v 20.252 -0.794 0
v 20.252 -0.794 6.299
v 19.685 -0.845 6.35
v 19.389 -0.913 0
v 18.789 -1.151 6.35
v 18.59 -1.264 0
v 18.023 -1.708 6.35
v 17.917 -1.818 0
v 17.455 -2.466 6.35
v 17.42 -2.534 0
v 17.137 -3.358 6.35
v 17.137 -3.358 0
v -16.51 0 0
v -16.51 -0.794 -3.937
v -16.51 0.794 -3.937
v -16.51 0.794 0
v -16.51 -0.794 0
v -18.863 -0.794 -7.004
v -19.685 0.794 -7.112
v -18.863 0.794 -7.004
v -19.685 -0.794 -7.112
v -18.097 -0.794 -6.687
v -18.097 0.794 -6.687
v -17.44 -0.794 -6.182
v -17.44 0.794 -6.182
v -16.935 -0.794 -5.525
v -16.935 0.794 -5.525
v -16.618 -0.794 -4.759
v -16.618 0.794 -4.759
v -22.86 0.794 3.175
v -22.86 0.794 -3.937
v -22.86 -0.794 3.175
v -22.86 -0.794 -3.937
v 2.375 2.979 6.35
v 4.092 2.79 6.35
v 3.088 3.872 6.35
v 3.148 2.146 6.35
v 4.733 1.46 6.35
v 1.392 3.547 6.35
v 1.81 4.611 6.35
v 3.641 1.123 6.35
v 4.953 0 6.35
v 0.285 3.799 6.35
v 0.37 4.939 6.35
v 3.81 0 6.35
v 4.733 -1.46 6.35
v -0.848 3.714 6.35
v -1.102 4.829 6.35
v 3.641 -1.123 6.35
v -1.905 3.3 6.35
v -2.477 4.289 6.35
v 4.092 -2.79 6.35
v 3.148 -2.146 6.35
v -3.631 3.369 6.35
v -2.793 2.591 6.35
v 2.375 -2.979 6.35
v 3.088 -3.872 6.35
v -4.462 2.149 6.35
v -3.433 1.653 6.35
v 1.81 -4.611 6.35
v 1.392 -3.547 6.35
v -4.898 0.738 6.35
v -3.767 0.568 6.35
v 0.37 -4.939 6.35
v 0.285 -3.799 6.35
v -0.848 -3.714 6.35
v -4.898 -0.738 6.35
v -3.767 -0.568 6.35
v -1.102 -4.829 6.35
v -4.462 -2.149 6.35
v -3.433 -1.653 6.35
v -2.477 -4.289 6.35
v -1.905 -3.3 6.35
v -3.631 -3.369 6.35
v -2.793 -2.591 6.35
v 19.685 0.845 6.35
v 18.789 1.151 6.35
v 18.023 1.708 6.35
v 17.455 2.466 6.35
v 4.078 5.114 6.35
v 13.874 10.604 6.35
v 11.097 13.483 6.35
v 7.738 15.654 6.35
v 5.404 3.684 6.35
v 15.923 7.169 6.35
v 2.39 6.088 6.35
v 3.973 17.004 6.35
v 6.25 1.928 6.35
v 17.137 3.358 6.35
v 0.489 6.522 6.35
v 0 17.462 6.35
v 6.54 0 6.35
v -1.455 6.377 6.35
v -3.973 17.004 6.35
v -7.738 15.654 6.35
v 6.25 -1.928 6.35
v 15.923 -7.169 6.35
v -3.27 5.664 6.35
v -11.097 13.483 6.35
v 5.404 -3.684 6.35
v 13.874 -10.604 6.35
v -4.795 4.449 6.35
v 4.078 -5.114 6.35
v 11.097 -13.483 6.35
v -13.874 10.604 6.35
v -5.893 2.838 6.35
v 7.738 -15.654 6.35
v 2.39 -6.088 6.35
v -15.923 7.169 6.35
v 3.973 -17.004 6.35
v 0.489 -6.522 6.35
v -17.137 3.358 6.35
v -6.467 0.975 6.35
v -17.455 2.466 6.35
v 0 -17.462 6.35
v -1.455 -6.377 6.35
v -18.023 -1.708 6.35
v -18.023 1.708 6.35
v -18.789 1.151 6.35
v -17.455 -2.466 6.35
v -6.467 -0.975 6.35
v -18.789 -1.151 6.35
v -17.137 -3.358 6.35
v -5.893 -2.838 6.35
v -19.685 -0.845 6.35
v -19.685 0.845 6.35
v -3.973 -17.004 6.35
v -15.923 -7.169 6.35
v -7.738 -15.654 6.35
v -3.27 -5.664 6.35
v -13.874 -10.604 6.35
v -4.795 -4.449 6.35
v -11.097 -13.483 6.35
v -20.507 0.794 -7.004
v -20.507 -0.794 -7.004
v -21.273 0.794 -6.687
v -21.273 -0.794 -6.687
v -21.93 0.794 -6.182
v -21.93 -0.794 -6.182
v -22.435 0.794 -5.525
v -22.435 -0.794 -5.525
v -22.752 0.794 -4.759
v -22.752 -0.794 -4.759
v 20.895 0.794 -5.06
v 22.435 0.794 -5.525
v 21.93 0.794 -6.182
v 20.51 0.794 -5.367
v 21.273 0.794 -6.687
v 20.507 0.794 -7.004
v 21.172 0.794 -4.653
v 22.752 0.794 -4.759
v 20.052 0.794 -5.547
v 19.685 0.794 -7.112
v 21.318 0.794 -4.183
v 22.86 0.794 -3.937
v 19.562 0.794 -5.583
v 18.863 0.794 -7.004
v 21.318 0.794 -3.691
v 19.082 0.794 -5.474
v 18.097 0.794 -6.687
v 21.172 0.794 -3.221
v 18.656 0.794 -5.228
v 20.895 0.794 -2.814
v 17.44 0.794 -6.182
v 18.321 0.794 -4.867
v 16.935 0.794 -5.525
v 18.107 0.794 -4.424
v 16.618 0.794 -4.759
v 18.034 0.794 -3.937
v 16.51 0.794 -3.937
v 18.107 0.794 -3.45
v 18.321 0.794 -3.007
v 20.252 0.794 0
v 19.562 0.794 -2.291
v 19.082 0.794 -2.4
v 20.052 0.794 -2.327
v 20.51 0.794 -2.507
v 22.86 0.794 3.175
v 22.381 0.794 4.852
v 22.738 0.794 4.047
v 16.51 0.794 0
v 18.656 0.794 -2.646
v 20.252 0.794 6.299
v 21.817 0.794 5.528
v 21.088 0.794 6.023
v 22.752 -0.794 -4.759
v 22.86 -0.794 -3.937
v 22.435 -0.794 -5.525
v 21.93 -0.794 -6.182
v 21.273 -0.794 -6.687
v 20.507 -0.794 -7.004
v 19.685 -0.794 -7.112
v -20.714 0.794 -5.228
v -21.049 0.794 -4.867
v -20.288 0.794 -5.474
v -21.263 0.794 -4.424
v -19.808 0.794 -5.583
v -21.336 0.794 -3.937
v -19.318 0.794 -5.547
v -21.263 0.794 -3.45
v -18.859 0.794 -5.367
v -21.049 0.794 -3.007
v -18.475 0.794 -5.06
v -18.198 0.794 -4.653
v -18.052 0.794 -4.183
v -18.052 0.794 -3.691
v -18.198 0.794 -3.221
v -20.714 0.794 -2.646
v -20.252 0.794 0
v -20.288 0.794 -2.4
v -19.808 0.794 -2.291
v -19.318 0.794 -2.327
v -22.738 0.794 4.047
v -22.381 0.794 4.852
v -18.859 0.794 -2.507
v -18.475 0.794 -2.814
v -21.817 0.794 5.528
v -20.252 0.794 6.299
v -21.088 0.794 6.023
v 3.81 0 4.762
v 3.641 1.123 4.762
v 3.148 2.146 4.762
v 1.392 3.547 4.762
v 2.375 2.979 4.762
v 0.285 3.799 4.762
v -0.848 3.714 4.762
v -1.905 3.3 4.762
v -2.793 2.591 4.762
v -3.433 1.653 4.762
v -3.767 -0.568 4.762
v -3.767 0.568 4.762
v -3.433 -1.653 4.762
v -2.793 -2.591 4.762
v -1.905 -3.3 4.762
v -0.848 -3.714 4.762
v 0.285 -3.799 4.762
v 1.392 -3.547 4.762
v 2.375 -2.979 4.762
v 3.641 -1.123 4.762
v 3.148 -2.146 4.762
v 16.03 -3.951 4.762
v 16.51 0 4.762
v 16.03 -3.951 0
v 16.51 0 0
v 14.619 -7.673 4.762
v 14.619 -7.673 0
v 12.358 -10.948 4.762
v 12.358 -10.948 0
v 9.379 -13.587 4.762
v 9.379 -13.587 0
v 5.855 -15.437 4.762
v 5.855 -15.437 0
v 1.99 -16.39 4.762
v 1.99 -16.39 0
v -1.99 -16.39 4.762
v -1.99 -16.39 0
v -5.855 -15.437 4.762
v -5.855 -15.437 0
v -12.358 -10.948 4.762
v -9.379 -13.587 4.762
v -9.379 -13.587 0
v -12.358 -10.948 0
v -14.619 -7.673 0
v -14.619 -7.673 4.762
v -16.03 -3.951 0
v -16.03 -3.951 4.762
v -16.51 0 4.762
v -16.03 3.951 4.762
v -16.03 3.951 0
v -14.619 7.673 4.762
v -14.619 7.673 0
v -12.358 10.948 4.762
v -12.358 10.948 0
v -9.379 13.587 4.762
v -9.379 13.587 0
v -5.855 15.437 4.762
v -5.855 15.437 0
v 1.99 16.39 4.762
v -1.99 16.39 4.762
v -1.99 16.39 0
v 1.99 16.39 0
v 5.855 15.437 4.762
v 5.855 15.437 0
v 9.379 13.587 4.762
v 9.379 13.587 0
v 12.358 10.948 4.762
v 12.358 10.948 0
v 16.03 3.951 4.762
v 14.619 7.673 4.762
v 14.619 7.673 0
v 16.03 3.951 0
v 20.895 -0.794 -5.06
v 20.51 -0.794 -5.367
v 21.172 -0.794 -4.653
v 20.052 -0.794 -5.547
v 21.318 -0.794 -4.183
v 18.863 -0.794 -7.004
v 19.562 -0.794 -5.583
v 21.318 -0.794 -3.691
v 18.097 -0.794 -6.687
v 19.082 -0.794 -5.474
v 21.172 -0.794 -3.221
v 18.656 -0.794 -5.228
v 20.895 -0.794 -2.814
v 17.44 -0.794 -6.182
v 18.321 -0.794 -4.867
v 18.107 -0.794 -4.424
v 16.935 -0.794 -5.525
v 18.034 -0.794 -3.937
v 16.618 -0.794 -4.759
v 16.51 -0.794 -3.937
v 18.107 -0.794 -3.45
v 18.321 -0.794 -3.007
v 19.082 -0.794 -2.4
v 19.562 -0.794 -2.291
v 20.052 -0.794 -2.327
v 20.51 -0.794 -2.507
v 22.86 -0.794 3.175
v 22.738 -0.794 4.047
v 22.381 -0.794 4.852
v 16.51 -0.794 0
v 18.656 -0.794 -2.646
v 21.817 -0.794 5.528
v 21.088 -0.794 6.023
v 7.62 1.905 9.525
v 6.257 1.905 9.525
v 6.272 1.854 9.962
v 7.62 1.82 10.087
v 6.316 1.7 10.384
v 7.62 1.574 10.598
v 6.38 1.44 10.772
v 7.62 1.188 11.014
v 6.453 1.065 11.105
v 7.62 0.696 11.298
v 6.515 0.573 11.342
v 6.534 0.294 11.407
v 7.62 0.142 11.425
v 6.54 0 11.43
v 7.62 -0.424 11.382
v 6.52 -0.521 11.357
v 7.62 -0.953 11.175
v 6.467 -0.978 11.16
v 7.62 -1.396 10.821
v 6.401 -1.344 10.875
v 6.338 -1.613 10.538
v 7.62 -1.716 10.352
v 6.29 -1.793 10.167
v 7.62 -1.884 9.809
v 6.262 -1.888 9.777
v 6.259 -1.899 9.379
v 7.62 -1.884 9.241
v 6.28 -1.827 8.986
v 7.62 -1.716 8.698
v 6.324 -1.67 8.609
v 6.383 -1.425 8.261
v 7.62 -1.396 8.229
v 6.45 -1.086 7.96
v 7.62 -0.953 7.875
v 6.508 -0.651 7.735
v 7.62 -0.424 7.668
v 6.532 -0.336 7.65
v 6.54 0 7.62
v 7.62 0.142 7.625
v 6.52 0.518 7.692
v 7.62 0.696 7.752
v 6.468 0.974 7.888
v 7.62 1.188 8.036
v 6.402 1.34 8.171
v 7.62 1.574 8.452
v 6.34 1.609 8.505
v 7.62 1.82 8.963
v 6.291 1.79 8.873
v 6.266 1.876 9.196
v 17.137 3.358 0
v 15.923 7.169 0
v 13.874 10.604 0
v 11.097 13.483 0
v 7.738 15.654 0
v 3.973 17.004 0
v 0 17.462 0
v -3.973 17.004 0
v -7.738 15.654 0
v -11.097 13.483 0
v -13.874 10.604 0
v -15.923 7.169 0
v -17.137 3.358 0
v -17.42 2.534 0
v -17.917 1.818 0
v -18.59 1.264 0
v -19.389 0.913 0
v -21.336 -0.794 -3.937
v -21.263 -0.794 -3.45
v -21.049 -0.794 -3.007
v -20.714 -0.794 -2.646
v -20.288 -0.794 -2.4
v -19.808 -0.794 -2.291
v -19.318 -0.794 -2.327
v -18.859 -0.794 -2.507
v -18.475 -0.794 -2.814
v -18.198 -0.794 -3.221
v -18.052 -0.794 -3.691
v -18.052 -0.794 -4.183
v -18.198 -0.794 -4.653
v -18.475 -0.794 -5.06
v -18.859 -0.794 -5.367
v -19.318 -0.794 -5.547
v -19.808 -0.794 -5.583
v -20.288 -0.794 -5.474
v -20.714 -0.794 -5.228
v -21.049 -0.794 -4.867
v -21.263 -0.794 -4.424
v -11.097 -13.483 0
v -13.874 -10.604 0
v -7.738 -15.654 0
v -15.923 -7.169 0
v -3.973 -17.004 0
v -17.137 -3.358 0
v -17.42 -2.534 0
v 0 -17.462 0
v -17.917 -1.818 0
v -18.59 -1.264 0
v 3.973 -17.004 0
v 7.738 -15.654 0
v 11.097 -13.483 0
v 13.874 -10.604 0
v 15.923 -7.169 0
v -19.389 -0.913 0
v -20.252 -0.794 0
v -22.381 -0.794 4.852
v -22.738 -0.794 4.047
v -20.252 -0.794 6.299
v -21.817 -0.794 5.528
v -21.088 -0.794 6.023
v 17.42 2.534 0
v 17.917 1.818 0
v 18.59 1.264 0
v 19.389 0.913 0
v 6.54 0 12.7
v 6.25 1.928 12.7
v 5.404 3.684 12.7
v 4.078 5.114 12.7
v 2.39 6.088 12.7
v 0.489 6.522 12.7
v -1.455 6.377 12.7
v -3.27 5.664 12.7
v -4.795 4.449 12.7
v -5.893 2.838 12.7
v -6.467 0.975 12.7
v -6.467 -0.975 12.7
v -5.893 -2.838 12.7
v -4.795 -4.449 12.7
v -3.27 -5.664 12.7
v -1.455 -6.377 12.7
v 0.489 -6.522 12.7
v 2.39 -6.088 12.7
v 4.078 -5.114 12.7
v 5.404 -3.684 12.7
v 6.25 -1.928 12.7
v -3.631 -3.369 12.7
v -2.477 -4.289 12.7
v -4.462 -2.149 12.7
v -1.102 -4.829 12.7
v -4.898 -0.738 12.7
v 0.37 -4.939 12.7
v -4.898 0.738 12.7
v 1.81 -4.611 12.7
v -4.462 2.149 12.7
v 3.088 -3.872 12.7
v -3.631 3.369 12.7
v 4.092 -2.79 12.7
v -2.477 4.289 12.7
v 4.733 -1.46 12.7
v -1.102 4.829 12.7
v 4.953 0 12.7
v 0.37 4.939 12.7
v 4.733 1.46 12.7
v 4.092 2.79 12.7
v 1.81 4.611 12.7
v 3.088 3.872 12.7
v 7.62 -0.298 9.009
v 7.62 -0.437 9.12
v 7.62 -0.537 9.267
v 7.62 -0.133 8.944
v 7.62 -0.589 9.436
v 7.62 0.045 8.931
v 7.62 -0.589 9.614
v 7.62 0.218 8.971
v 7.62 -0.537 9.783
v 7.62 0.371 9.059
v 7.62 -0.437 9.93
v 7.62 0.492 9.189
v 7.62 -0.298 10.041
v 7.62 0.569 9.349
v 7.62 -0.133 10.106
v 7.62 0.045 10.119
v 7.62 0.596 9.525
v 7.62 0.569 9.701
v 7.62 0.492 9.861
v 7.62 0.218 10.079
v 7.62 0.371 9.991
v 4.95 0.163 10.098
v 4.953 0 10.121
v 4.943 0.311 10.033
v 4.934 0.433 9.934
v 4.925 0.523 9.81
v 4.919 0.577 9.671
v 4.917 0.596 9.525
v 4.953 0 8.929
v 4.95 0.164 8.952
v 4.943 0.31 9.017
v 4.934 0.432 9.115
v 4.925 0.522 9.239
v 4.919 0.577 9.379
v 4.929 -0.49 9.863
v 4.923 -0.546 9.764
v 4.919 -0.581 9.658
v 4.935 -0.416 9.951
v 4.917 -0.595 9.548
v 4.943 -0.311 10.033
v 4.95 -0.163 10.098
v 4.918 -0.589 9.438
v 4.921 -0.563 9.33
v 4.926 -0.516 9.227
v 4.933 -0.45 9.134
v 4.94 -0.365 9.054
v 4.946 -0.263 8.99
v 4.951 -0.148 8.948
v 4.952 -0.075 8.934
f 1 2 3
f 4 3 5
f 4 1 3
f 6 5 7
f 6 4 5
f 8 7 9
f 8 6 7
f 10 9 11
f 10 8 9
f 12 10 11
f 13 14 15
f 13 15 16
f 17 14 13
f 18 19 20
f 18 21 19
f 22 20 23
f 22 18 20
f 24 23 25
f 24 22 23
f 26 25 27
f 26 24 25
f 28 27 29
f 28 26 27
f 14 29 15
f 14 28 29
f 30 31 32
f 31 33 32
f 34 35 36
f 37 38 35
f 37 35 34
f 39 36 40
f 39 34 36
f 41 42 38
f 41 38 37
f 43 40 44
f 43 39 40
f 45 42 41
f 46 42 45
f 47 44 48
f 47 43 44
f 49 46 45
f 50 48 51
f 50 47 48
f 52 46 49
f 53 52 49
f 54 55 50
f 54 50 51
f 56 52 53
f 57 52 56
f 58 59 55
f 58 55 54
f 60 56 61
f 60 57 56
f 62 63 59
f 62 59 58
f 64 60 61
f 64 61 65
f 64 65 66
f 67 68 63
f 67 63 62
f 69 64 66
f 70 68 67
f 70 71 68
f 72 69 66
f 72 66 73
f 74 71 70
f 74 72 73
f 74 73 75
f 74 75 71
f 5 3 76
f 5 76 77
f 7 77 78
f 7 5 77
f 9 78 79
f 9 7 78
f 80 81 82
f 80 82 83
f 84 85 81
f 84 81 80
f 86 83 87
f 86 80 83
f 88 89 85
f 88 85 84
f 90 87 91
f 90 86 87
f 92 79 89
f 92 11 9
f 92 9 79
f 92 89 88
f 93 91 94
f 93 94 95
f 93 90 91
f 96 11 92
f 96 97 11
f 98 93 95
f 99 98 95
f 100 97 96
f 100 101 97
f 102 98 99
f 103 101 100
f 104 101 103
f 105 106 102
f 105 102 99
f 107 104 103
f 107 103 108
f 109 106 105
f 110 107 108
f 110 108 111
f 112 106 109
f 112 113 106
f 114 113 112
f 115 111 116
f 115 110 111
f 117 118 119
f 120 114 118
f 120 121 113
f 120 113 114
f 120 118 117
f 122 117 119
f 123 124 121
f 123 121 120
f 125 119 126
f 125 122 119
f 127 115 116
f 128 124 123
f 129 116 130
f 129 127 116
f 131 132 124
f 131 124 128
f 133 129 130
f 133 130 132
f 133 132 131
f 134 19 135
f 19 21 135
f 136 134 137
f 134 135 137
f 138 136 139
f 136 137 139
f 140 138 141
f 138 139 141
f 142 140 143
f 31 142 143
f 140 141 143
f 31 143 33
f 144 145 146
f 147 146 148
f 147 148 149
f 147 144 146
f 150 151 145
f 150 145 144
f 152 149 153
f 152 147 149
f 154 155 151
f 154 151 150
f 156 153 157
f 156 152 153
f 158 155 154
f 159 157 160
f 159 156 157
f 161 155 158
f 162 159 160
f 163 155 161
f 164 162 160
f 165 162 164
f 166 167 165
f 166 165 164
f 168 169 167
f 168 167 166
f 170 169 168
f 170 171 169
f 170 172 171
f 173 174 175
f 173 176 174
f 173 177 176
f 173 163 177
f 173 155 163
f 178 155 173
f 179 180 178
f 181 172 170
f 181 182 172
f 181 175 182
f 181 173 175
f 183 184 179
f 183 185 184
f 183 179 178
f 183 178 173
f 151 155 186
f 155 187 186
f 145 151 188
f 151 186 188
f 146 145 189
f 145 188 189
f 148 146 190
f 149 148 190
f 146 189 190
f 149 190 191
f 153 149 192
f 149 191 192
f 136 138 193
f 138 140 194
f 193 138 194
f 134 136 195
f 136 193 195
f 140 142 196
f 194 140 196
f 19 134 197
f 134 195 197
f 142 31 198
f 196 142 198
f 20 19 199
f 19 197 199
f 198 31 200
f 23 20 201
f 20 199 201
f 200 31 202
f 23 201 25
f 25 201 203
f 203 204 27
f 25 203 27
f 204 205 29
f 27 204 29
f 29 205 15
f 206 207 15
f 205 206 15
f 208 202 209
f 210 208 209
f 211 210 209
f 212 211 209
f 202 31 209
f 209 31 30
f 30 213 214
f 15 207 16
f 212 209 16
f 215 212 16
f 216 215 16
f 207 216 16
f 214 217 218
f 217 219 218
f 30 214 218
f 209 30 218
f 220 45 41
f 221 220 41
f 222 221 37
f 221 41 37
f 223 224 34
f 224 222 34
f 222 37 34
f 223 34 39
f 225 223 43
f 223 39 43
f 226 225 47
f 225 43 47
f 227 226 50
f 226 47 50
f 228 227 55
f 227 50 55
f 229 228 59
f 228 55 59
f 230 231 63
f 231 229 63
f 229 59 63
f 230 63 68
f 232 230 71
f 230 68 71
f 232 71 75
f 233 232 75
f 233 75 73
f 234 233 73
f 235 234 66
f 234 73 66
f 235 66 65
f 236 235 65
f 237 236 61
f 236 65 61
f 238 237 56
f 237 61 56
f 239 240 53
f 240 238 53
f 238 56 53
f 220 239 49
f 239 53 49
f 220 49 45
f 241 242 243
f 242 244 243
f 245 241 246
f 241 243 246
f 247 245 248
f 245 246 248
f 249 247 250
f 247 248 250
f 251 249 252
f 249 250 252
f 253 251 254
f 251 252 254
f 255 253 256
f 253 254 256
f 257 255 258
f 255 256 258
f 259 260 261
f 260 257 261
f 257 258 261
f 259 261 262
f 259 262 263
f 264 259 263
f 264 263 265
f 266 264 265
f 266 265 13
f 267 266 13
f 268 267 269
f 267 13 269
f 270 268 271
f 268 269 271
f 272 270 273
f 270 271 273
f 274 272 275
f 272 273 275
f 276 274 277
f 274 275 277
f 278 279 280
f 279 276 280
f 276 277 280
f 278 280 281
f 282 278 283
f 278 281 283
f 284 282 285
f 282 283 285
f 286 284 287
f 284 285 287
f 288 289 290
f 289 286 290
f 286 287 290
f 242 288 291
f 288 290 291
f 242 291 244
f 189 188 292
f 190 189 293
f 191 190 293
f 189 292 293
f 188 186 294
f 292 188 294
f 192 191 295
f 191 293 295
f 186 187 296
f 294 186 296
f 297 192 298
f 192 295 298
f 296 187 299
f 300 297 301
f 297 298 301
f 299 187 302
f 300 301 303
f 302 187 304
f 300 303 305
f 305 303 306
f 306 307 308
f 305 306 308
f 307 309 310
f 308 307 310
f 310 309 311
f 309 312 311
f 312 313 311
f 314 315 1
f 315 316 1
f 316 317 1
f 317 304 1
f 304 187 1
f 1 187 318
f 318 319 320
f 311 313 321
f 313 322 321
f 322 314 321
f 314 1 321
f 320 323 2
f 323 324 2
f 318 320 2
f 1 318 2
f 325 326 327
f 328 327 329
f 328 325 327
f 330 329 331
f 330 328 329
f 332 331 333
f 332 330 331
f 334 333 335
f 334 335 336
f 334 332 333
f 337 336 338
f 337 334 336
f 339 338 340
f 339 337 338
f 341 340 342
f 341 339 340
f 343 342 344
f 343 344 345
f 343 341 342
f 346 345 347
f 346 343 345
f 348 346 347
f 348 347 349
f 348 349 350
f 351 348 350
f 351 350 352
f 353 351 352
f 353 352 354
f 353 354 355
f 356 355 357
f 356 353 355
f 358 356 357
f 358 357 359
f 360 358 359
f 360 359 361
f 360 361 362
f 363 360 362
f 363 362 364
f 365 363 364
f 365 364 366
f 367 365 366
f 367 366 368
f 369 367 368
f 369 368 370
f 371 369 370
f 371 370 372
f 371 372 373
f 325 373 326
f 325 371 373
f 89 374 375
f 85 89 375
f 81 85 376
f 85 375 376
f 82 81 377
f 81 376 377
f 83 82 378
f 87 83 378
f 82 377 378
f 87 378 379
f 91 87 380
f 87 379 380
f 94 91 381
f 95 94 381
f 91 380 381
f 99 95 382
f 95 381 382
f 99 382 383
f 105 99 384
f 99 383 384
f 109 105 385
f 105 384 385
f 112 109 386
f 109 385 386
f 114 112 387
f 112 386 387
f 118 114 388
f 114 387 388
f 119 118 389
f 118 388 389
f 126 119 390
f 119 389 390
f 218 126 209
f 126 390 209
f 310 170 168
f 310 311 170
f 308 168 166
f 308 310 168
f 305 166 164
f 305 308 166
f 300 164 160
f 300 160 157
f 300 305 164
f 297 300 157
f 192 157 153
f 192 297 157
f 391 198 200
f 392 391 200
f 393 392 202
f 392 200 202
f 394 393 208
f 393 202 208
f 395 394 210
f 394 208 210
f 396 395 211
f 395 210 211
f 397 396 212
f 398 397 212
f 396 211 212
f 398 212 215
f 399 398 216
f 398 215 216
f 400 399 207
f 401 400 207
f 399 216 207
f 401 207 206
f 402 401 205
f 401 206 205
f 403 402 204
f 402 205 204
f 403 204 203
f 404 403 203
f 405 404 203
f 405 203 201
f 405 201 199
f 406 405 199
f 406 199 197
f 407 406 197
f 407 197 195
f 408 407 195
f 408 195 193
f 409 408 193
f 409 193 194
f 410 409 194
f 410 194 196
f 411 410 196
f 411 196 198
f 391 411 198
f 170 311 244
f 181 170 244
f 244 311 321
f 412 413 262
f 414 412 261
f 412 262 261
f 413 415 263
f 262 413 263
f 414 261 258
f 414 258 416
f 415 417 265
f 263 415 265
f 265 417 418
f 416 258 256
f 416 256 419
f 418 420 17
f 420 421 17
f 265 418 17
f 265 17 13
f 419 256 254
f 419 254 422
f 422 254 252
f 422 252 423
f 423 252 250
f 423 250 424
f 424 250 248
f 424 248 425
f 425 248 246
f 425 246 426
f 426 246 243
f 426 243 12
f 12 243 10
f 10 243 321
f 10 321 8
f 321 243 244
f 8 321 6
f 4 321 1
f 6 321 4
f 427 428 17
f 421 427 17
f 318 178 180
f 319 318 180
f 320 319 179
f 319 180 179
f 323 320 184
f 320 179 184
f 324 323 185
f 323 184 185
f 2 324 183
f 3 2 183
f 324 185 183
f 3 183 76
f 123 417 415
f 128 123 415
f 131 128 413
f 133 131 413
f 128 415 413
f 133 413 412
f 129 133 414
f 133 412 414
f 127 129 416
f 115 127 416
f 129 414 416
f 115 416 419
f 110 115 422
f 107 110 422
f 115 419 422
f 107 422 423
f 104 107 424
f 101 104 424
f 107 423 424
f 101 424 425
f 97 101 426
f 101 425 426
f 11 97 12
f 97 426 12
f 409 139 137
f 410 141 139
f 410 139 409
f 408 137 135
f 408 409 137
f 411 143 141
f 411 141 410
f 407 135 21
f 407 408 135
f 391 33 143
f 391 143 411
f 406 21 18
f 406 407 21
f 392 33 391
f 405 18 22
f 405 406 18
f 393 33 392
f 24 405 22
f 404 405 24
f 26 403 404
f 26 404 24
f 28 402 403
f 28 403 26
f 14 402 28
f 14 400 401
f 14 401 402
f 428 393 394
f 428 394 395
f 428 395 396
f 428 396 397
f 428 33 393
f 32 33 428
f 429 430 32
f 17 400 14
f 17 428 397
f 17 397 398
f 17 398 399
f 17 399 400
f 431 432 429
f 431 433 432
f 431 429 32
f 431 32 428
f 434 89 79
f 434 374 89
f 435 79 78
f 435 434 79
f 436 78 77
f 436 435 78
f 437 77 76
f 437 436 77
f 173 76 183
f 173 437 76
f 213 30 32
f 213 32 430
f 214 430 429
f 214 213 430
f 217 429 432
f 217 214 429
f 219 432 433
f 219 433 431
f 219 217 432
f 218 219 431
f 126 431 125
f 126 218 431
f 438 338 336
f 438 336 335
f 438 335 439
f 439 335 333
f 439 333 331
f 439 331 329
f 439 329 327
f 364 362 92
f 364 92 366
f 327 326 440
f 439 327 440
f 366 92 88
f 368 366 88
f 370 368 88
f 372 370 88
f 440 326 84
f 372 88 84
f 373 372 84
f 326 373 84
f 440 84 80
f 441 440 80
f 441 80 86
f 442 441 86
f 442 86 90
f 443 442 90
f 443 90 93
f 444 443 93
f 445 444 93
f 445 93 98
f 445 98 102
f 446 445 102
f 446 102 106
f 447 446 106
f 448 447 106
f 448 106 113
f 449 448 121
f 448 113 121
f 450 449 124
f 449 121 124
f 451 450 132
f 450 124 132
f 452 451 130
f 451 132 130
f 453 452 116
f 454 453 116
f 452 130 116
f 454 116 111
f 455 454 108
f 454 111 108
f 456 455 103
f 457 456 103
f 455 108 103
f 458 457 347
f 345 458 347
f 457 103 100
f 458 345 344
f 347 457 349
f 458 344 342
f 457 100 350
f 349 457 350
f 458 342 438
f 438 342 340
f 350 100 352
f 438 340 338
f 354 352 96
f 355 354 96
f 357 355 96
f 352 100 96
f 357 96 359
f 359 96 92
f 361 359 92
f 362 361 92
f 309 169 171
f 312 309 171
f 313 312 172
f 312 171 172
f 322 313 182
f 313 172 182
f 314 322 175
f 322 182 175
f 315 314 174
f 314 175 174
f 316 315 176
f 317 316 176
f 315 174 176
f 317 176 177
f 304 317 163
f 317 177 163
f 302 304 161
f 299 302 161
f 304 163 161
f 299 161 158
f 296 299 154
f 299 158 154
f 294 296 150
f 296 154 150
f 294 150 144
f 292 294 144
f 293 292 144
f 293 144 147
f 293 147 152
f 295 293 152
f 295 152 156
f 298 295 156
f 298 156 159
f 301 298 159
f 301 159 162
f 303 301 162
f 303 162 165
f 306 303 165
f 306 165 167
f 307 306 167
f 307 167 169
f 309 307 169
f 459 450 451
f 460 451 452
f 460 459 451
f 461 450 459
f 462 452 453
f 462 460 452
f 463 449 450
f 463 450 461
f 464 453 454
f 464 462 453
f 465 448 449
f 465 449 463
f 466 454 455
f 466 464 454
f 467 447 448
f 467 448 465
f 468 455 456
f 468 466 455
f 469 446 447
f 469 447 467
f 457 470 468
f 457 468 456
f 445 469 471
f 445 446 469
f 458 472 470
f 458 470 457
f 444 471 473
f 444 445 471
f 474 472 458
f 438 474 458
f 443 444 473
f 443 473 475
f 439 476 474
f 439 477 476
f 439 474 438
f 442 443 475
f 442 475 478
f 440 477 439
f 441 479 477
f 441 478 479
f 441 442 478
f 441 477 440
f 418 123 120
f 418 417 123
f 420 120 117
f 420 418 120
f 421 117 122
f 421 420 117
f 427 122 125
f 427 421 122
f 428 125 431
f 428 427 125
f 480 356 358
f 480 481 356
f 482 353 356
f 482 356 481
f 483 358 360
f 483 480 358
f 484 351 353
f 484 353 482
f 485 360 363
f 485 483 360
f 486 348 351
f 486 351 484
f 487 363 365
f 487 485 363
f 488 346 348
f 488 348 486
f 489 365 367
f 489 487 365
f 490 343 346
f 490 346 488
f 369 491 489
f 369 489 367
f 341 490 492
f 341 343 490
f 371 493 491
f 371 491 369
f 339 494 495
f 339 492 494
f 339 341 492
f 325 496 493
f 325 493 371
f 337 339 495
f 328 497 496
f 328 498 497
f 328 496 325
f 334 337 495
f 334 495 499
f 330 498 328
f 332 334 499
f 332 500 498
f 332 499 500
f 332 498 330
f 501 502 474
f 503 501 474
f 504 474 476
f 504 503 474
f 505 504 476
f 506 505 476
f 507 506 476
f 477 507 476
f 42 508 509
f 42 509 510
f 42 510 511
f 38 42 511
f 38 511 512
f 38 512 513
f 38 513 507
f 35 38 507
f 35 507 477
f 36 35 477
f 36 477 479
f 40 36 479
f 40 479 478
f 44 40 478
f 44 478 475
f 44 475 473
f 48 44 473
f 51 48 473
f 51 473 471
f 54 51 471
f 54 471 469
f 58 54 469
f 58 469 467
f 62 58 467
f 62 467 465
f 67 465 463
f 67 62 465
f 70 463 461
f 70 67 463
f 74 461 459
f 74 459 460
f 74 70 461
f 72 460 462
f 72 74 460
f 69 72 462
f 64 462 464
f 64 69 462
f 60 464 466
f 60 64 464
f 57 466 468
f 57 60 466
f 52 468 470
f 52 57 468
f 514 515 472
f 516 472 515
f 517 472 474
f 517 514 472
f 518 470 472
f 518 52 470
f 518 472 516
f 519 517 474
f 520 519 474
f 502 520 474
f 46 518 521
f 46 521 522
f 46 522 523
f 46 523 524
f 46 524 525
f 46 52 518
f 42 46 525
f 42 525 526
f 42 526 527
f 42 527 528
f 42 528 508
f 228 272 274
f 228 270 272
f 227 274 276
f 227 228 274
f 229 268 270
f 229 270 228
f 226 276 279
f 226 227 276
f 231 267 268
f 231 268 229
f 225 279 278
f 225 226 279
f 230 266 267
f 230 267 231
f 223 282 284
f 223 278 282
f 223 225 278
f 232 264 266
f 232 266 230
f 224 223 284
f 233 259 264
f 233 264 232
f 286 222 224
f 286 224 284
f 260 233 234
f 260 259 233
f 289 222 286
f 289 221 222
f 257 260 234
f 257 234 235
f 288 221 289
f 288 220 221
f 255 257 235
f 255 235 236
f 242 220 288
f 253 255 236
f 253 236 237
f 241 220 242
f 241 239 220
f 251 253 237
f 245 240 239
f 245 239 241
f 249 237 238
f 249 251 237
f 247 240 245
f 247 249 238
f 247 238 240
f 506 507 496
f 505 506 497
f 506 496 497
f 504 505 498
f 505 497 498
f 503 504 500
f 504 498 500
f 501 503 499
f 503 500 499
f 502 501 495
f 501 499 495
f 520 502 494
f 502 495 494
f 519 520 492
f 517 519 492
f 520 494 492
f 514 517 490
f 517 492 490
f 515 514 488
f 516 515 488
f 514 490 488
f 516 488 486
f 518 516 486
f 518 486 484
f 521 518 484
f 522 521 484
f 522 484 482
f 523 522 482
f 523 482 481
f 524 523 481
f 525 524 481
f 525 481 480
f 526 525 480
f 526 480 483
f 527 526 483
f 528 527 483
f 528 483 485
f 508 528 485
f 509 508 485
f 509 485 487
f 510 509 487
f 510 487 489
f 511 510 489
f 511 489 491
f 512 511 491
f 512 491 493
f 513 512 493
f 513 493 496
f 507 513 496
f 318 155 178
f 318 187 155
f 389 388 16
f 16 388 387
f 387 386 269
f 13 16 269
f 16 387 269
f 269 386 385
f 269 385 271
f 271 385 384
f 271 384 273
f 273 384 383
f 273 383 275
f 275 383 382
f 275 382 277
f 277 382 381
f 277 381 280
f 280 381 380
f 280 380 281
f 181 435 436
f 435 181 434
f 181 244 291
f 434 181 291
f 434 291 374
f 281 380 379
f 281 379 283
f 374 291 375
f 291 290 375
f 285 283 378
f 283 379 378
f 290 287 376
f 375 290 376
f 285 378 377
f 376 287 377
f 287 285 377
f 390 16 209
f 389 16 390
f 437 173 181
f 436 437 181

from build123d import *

# Parameters (mm, degrees)
F0_R      = 17.4625
F1_DEPTH  = 6.35
F2_R      = 16.51
F3_DEPTH  = 4.7625
F4_R      = 3.81
F5_DEPTH  = 6.351
F6_W      = 6.35
F6_H      = 13.462
F7_DEPTH  = 0.79375
F9_R      = 3.17499
F10_R     = 3.175
F11_R     = 1.651
F12_DEPTH = 18.25725
F13_R     = 6.5405
F13_R_2   = 4.953
F14_DEPTH = 6.35
F16_R     = 1.905
F17_DEPTH = 1.3630747169
F18_R     = 0.59563
F19_DEPTH = 2.7039446902


# Not quite as in the source:
# - a fillet or chamfer is up to 0.001 mm smaller than in the source, because OpenCascade refuses the exact size


with BuildPart() as f1:
    # F0 (on Top) → F1 (new body)
    with BuildSketch(Plane.XY):
        Circle(F0_R)
    extrude(amount=F1_DEPTH)

    # F2 (on face) → F3 (cut)
    with BuildSketch(Plane(origin=(0, 0, 0), x_dir=(1, 0, 0), z_dir=(0, 0, -1))):
        Circle(F2_R)
    extrude(amount=-F3_DEPTH, mode=Mode.SUBTRACT)

    # F4 (on face) → F5 (cut, through all)
    with BuildSketch(Plane.XY.offset(6.35)):
        Circle(F4_R)
    extrude(amount=-F5_DEPTH, mode=Mode.SUBTRACT)

    # F6 (on Front) → F7 (join, symmetric)
    with BuildSketch(Plane.XZ):
        with Locations((-19.685, -0.381)):
            Rectangle(F6_W, F6_H)
    extrude(amount=F7_DEPTH, both=True)

    # F8: F1 across plane


with BuildPart() as f1_1:
    add(f1.part)
    add(f1.part.mirror(Plane.YZ))

    # F9 (radius 3.175 in the source; OpenCascade refuses exactly that, so slightly less here)
    f9_edges = [f1_1.edges().sort_by_distance(p)[0] for p in [
        (-22.86, 0, 6.35),
        (-22.86, 0, -7.112),
        (-16.51, 0, -7.112),
        (22.86, 0, 6.35),
        (22.86, 0, -7.112),
        (16.51, 0, -7.112),
    ]]
    fillet(f9_edges, radius=F9_R)

    # F10 (call 1 of 4: OpenCascade refuses the feature's edges together)
    f10_edges = [f1_1.edges().sort_by_distance(p)[0] for p in [
        (-17.444451, -0.79375, 3.175),
    ]]
    fillet(f10_edges, radius=F10_R)

    # F10#2 (call 2 of 4)
    f10_2_edges = [f1_1.edges().sort_by_distance(p)[0] for p in [
        (-17.444451, 0.79375, 3.175),
    ]]
    fillet(f10_2_edges, radius=F10_R)

    # F10#3 (call 3 of 4)
    f10_3_edges = [f1_1.edges().sort_by_distance(p)[0] for p in [
        (17.444451, -0.79375, 3.175),
    ]]
    fillet(f10_3_edges, radius=F10_R)

    # F10#4 (call 4 of 4)
    f10_4_edges = [f1_1.edges().sort_by_distance(p)[0] for p in [
        (17.444451, 0.79375, 3.175),
    ]]
    fillet(f10_4_edges, radius=F10_R)

    # F11 (on face) → F12 (cut, through all)
    with BuildSketch(Plane(origin=(0, 0.79375, 0), x_dir=(-1, 0, 0), z_dir=(0, 1, 0))):
        with Locations((19.685, -3.937)):
            Circle(F11_R)
        with Locations((-19.685, -3.937)):
            Circle(F11_R)
    extrude(amount=-F12_DEPTH, mode=Mode.SUBTRACT)

    # F13 (on face) → F14 (join)
    with BuildSketch(Plane.XY.offset(6.35)):
        Circle(F13_R)
        Circle(F13_R_2, mode=Mode.SUBTRACT)
    extrude(amount=F14_DEPTH)

    # F16 (on offset) → F17 (join, through all)
    with BuildSketch(Plane.YZ.offset(7.62)):
        with Locations((0, 9.525)):
            Circle(F16_R)
    extrude(amount=-F17_DEPTH)

    # F18 (on face) → F19 (cut, through all)
    with BuildSketch(Plane.YZ.offset(7.62)):
        with Locations((0, 9.525)):
            Circle(F18_R)
    extrude(amount=-F19_DEPTH, mode=Mode.SUBTRACT)


solid = f1_1.part
